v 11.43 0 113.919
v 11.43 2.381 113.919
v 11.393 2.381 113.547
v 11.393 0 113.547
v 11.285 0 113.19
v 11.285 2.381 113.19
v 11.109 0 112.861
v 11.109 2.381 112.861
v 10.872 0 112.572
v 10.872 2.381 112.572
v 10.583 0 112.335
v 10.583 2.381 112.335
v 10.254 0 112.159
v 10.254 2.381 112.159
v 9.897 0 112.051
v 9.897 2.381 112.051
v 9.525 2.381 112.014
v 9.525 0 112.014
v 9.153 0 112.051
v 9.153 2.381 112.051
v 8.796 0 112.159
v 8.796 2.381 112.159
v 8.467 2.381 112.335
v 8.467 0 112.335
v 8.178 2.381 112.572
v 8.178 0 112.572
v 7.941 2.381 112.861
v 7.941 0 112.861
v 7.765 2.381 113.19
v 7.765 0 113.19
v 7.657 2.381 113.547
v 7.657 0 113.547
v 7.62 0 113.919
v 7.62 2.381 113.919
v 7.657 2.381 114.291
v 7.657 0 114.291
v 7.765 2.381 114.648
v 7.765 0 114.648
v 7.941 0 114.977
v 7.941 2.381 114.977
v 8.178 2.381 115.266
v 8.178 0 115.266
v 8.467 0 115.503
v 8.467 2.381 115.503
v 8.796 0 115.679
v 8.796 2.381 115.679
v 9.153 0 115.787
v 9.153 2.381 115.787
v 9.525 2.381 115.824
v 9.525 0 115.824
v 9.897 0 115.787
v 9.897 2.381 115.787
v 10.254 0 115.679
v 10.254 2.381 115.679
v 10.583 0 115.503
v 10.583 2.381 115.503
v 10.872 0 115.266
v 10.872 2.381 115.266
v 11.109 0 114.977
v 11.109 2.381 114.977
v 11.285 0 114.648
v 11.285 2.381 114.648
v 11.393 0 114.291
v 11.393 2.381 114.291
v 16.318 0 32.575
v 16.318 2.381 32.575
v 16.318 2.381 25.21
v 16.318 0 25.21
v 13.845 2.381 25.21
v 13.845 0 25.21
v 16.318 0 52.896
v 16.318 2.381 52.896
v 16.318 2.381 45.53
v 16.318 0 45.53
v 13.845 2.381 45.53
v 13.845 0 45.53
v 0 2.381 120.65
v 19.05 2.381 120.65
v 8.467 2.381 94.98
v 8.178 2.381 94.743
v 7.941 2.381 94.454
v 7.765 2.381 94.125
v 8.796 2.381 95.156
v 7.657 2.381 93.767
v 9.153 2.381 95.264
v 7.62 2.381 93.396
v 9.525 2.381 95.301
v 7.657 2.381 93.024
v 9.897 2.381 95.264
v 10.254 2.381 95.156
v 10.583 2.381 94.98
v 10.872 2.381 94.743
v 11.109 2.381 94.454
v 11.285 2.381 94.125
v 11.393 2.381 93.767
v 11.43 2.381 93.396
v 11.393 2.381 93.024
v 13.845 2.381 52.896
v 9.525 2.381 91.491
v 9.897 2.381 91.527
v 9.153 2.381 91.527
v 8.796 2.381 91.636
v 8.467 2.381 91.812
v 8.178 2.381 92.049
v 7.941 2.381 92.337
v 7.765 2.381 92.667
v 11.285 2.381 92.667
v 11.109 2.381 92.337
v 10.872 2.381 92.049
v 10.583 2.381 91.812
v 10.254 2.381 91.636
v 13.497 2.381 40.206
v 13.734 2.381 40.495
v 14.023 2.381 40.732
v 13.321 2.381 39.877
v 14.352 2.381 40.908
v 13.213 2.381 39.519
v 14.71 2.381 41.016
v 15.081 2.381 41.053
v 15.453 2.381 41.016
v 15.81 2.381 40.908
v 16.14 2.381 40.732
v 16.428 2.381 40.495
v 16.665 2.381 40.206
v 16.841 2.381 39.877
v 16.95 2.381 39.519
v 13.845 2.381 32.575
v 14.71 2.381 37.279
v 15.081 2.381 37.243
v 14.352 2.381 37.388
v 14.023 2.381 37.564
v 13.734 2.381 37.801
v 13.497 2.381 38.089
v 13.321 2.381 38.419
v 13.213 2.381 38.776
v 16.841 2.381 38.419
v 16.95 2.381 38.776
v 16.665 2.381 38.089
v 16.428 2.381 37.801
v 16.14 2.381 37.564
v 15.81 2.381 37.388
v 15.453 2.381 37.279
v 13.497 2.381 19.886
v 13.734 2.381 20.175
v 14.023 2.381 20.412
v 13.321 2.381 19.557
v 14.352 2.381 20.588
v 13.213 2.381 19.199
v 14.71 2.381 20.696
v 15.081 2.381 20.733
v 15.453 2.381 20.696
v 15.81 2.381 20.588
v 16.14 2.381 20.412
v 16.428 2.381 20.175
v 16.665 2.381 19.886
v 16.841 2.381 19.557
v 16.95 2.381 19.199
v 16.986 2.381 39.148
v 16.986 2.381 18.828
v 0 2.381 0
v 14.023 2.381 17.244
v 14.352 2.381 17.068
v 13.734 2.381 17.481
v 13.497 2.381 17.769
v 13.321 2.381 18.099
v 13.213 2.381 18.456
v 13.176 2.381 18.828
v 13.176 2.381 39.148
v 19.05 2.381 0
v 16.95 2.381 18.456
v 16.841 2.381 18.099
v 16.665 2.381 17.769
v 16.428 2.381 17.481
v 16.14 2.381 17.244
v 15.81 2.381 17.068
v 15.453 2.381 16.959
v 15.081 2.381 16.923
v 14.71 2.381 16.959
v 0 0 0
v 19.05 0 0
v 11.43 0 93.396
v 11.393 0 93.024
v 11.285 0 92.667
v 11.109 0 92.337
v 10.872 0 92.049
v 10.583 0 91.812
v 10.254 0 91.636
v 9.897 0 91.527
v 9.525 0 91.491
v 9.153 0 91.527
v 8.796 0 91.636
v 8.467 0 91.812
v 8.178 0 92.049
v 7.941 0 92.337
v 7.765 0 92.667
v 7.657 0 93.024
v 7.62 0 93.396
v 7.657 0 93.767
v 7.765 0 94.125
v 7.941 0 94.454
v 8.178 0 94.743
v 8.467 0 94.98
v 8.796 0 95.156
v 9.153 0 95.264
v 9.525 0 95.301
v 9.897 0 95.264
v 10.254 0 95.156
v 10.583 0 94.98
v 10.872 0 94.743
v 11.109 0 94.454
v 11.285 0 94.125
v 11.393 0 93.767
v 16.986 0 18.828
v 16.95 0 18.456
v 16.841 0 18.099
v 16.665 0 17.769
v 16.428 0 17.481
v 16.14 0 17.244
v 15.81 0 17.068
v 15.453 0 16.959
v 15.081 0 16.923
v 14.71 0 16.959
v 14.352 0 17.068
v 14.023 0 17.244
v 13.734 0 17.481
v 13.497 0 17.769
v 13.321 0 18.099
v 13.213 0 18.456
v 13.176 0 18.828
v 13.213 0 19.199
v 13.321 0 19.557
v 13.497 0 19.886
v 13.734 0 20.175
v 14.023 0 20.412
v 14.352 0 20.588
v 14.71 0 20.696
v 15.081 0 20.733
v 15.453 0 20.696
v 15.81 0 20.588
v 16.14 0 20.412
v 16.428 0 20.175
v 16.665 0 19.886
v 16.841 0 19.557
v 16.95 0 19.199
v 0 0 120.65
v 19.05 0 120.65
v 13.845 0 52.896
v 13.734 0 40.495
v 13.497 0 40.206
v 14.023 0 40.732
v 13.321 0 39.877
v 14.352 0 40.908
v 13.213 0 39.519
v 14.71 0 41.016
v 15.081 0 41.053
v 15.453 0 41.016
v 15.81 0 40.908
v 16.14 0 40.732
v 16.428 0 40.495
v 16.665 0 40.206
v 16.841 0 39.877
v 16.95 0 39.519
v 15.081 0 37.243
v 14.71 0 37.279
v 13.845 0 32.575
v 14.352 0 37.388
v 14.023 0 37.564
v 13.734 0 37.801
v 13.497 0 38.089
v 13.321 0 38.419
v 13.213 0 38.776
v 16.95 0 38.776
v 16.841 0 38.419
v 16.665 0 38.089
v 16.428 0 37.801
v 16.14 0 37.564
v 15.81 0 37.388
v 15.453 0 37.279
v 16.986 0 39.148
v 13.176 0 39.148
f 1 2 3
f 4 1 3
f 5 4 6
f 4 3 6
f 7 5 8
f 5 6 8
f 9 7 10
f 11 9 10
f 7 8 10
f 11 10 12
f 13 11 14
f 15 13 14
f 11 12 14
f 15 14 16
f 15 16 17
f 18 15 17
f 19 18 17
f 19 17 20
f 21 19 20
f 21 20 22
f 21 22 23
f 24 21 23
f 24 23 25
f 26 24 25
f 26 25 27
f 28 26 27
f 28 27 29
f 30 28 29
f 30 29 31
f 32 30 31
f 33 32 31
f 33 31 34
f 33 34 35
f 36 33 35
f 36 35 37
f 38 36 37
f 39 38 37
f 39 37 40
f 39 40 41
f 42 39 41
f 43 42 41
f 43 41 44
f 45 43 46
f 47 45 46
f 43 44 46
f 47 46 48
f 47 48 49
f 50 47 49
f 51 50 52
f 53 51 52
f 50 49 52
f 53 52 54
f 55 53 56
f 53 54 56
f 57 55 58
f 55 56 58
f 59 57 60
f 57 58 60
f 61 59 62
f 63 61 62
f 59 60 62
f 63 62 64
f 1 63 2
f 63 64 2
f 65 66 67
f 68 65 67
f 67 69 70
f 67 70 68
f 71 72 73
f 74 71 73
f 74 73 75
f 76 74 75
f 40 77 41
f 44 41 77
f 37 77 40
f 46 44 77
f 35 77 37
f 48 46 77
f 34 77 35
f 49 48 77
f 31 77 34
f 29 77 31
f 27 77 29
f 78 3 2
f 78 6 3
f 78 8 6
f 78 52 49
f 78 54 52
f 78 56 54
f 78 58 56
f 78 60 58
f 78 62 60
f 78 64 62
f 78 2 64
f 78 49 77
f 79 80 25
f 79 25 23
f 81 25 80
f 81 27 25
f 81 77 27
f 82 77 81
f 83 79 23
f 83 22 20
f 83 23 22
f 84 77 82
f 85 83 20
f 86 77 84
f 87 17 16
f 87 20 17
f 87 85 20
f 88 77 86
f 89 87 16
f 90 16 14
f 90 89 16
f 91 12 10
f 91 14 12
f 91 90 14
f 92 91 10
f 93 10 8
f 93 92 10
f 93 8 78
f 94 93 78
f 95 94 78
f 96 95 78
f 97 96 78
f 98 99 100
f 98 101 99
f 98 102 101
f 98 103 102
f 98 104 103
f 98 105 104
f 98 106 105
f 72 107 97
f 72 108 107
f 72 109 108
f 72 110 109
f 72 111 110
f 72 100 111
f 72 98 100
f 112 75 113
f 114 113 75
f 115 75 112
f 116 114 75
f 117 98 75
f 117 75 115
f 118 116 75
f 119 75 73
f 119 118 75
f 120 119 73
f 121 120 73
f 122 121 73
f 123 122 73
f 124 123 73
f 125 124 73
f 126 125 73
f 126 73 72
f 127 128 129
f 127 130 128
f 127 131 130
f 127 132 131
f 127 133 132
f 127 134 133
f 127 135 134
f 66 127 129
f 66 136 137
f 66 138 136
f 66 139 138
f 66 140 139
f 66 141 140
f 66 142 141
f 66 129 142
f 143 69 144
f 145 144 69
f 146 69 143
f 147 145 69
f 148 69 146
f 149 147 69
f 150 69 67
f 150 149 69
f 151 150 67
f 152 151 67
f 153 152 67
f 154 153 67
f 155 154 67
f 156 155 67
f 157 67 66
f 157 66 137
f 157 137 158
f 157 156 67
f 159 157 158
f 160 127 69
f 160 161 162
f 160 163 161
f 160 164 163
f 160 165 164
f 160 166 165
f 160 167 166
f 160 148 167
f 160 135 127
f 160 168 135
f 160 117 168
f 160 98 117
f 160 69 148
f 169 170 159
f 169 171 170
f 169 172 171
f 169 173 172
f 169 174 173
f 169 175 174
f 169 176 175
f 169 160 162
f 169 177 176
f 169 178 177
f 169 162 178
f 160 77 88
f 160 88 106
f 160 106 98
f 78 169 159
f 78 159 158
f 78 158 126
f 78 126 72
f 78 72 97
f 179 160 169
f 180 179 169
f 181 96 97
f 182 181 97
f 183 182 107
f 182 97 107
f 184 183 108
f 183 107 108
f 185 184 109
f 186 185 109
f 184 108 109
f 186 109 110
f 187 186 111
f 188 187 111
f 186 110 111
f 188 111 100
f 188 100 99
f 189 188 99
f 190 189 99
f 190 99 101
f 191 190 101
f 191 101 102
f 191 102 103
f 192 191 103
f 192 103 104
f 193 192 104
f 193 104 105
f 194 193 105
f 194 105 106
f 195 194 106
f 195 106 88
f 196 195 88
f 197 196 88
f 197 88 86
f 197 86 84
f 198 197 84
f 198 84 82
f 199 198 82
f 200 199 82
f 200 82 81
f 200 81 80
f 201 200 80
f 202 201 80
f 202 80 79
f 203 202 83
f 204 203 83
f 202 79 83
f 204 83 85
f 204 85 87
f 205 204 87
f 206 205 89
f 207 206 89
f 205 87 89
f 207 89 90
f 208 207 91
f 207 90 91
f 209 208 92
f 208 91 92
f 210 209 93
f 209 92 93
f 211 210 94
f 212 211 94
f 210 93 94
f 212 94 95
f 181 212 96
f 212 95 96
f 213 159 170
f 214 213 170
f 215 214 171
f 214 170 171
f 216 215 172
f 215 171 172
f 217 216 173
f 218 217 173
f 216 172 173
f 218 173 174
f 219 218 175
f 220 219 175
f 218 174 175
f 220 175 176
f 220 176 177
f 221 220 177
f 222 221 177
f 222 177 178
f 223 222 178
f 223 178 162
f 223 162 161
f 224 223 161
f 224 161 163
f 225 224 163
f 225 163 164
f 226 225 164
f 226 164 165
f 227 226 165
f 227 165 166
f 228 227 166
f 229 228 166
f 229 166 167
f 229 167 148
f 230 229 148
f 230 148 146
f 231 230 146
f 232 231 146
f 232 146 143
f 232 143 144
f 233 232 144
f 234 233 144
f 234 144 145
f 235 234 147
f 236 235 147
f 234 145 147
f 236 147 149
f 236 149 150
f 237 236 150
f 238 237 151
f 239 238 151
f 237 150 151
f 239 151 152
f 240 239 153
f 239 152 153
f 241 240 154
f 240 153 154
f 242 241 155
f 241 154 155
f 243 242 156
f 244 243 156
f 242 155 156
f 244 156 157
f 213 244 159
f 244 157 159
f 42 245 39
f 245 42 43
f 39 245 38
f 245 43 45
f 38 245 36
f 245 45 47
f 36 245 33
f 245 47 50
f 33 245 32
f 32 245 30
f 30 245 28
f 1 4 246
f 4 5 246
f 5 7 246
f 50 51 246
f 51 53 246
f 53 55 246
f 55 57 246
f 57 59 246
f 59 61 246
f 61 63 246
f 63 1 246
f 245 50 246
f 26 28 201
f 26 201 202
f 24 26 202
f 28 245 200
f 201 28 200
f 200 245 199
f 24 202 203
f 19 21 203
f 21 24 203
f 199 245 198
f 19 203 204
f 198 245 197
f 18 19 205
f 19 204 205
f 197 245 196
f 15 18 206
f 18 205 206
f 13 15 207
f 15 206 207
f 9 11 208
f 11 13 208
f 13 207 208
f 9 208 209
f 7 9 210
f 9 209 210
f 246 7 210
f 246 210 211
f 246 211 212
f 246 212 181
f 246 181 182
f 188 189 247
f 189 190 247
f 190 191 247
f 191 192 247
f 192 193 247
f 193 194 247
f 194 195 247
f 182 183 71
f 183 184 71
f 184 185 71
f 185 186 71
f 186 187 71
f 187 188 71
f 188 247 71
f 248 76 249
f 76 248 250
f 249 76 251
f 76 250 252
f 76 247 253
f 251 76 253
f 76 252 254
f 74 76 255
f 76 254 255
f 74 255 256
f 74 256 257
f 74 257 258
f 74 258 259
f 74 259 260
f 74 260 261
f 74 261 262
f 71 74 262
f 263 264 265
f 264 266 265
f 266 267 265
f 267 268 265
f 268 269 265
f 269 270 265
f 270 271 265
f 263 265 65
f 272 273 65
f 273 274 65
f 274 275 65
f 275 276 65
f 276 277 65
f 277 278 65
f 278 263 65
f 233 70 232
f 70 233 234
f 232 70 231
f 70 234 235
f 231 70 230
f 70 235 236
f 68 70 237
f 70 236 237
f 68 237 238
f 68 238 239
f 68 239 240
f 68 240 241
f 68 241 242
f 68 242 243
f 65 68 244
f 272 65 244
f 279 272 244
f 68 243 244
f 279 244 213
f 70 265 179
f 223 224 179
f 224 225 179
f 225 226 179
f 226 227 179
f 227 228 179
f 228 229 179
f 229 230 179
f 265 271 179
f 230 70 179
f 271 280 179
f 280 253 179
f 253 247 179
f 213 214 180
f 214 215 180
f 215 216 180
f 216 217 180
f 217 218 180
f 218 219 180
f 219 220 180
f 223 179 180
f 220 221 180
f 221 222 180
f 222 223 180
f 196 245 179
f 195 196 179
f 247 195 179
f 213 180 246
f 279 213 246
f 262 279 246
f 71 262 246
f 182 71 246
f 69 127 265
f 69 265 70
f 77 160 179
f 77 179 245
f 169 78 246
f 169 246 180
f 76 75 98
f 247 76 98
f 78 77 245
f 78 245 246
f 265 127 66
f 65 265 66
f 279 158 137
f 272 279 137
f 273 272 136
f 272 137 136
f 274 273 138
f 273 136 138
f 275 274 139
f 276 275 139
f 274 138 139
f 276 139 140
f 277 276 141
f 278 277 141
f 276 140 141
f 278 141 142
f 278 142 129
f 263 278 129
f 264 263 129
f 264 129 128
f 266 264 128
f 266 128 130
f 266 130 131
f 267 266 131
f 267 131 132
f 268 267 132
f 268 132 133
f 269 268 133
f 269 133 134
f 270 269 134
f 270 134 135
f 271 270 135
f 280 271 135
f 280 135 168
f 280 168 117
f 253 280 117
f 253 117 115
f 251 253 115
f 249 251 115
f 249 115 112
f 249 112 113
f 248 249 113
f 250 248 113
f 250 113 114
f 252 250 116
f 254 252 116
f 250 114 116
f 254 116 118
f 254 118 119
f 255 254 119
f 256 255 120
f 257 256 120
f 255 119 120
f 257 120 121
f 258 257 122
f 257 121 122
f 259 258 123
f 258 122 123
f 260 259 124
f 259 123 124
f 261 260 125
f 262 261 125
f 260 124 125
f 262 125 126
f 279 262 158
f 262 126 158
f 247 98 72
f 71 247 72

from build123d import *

# Parameters (mm, degrees)
SKETCH1_W           = 19.05
SKETCH1_H           = 2.38125
BOSS_EXTRUDE1_DEPTH = 88.9
SKETCH5_R           = 1.905
CUT_EXTRUDE4_DEPTH  = 3.38125
SKETCH9_W           = 19.05
SKETCH9_H           = 29.6545
BOSS_EXTRUDE4_DEPTH = 2.38125
BOSS_EXTRUDE5_DEPTH = 2.38125
SKETCH11_R          = 1.905
CUT_EXTRUDE6_DEPTH  = 2.54
SKETCH12_W          = 19.05
SKETCH12_H          = 29.6545
CUT_EXTRUDE7_DEPTH  = 3.38125


with BuildPart() as part:
    # Sketch1 → Boss-Extrude1 (new body)
    with BuildSketch(Plane.XY):
        with Locations((9.525, 1.190625)):
            Rectangle(SKETCH1_W, SKETCH1_H)
    extrude(amount=BOSS_EXTRUDE1_DEPTH)

    # Sketch5 → Cut-Extrude4 (cut, through all)
    with BuildSketch(Plane(origin=(0, 2.38125, 0), x_dir=(1, 0, 0), z_dir=(0, 1, 0))):
        with Locations((15.08125, -39.14775)):
            Circle(SKETCH5_R)
        with Locations((15.08125, -18.82775)):
            Circle(SKETCH5_R)
        Polygon((16.317595, -28.98775), (16.317595, -32.5755), (15.08125, -32.5755), (13.844905, -32.5755), (13.844905, -25.2095), (16.317595, -25.2095), align=None)
        Polygon((15.08125, -52.8955), (16.317595, -52.8955), (16.317595, -45.5295), (13.844905, -45.5295), (13.844905, -52.8955), align=None)
    extrude(amount=-CUT_EXTRUDE4_DEPTH, mode=Mode.SUBTRACT)

    # Sketch9 → Boss-Extrude4 (add)
    with BuildSketch(Plane(origin=(0, 2.38125, 0), x_dir=(1, 0, 0), z_dir=(0, 1, 0))):
        with Locations((9.525, 14.82725)):
            Rectangle(SKETCH9_W, SKETCH9_H)
    extrude(amount=-BOSS_EXTRUDE4_DEPTH)

    # Sketch8 → Boss-Extrude5 (add)
    with BuildSketch(Plane(origin=(0, 2.38125, 0), x_dir=(1, 0, 0), z_dir=(0, 1, 0))):
        Polygon((19.05, -88.9), (0, -88.9), (0, -114.3), (0, -120.65), (19.05, -120.65), (19.05, -114.3), align=None)
    extrude(amount=-BOSS_EXTRUDE5_DEPTH)

    # Sketch11 → Cut-Extrude6 (cut)
    with BuildSketch(Plane(origin=(0, 2.38125, 0), x_dir=(1, 0, 0), z_dir=(0, 1, 0))):
        with Locations((9.525, -113.919)):
            Circle(SKETCH11_R)
        with Locations((9.525, -93.3958)):
            Circle(SKETCH11_R)
    extrude(amount=-CUT_EXTRUDE6_DEPTH, mode=Mode.SUBTRACT)

    # Sketch12 → Cut-Extrude7 (cut, through all)
    with BuildSketch(Plane(origin=(0, 2.38125, 0), x_dir=(1, 0, 0), z_dir=(0, 1, 0))):
        with Locations((9.525, 14.82725)):
            Rectangle(SKETCH12_W, SKETCH12_H)
    extrude(amount=-CUT_EXTRUDE7_DEPTH, mode=Mode.SUBTRACT)


solid = part.part
